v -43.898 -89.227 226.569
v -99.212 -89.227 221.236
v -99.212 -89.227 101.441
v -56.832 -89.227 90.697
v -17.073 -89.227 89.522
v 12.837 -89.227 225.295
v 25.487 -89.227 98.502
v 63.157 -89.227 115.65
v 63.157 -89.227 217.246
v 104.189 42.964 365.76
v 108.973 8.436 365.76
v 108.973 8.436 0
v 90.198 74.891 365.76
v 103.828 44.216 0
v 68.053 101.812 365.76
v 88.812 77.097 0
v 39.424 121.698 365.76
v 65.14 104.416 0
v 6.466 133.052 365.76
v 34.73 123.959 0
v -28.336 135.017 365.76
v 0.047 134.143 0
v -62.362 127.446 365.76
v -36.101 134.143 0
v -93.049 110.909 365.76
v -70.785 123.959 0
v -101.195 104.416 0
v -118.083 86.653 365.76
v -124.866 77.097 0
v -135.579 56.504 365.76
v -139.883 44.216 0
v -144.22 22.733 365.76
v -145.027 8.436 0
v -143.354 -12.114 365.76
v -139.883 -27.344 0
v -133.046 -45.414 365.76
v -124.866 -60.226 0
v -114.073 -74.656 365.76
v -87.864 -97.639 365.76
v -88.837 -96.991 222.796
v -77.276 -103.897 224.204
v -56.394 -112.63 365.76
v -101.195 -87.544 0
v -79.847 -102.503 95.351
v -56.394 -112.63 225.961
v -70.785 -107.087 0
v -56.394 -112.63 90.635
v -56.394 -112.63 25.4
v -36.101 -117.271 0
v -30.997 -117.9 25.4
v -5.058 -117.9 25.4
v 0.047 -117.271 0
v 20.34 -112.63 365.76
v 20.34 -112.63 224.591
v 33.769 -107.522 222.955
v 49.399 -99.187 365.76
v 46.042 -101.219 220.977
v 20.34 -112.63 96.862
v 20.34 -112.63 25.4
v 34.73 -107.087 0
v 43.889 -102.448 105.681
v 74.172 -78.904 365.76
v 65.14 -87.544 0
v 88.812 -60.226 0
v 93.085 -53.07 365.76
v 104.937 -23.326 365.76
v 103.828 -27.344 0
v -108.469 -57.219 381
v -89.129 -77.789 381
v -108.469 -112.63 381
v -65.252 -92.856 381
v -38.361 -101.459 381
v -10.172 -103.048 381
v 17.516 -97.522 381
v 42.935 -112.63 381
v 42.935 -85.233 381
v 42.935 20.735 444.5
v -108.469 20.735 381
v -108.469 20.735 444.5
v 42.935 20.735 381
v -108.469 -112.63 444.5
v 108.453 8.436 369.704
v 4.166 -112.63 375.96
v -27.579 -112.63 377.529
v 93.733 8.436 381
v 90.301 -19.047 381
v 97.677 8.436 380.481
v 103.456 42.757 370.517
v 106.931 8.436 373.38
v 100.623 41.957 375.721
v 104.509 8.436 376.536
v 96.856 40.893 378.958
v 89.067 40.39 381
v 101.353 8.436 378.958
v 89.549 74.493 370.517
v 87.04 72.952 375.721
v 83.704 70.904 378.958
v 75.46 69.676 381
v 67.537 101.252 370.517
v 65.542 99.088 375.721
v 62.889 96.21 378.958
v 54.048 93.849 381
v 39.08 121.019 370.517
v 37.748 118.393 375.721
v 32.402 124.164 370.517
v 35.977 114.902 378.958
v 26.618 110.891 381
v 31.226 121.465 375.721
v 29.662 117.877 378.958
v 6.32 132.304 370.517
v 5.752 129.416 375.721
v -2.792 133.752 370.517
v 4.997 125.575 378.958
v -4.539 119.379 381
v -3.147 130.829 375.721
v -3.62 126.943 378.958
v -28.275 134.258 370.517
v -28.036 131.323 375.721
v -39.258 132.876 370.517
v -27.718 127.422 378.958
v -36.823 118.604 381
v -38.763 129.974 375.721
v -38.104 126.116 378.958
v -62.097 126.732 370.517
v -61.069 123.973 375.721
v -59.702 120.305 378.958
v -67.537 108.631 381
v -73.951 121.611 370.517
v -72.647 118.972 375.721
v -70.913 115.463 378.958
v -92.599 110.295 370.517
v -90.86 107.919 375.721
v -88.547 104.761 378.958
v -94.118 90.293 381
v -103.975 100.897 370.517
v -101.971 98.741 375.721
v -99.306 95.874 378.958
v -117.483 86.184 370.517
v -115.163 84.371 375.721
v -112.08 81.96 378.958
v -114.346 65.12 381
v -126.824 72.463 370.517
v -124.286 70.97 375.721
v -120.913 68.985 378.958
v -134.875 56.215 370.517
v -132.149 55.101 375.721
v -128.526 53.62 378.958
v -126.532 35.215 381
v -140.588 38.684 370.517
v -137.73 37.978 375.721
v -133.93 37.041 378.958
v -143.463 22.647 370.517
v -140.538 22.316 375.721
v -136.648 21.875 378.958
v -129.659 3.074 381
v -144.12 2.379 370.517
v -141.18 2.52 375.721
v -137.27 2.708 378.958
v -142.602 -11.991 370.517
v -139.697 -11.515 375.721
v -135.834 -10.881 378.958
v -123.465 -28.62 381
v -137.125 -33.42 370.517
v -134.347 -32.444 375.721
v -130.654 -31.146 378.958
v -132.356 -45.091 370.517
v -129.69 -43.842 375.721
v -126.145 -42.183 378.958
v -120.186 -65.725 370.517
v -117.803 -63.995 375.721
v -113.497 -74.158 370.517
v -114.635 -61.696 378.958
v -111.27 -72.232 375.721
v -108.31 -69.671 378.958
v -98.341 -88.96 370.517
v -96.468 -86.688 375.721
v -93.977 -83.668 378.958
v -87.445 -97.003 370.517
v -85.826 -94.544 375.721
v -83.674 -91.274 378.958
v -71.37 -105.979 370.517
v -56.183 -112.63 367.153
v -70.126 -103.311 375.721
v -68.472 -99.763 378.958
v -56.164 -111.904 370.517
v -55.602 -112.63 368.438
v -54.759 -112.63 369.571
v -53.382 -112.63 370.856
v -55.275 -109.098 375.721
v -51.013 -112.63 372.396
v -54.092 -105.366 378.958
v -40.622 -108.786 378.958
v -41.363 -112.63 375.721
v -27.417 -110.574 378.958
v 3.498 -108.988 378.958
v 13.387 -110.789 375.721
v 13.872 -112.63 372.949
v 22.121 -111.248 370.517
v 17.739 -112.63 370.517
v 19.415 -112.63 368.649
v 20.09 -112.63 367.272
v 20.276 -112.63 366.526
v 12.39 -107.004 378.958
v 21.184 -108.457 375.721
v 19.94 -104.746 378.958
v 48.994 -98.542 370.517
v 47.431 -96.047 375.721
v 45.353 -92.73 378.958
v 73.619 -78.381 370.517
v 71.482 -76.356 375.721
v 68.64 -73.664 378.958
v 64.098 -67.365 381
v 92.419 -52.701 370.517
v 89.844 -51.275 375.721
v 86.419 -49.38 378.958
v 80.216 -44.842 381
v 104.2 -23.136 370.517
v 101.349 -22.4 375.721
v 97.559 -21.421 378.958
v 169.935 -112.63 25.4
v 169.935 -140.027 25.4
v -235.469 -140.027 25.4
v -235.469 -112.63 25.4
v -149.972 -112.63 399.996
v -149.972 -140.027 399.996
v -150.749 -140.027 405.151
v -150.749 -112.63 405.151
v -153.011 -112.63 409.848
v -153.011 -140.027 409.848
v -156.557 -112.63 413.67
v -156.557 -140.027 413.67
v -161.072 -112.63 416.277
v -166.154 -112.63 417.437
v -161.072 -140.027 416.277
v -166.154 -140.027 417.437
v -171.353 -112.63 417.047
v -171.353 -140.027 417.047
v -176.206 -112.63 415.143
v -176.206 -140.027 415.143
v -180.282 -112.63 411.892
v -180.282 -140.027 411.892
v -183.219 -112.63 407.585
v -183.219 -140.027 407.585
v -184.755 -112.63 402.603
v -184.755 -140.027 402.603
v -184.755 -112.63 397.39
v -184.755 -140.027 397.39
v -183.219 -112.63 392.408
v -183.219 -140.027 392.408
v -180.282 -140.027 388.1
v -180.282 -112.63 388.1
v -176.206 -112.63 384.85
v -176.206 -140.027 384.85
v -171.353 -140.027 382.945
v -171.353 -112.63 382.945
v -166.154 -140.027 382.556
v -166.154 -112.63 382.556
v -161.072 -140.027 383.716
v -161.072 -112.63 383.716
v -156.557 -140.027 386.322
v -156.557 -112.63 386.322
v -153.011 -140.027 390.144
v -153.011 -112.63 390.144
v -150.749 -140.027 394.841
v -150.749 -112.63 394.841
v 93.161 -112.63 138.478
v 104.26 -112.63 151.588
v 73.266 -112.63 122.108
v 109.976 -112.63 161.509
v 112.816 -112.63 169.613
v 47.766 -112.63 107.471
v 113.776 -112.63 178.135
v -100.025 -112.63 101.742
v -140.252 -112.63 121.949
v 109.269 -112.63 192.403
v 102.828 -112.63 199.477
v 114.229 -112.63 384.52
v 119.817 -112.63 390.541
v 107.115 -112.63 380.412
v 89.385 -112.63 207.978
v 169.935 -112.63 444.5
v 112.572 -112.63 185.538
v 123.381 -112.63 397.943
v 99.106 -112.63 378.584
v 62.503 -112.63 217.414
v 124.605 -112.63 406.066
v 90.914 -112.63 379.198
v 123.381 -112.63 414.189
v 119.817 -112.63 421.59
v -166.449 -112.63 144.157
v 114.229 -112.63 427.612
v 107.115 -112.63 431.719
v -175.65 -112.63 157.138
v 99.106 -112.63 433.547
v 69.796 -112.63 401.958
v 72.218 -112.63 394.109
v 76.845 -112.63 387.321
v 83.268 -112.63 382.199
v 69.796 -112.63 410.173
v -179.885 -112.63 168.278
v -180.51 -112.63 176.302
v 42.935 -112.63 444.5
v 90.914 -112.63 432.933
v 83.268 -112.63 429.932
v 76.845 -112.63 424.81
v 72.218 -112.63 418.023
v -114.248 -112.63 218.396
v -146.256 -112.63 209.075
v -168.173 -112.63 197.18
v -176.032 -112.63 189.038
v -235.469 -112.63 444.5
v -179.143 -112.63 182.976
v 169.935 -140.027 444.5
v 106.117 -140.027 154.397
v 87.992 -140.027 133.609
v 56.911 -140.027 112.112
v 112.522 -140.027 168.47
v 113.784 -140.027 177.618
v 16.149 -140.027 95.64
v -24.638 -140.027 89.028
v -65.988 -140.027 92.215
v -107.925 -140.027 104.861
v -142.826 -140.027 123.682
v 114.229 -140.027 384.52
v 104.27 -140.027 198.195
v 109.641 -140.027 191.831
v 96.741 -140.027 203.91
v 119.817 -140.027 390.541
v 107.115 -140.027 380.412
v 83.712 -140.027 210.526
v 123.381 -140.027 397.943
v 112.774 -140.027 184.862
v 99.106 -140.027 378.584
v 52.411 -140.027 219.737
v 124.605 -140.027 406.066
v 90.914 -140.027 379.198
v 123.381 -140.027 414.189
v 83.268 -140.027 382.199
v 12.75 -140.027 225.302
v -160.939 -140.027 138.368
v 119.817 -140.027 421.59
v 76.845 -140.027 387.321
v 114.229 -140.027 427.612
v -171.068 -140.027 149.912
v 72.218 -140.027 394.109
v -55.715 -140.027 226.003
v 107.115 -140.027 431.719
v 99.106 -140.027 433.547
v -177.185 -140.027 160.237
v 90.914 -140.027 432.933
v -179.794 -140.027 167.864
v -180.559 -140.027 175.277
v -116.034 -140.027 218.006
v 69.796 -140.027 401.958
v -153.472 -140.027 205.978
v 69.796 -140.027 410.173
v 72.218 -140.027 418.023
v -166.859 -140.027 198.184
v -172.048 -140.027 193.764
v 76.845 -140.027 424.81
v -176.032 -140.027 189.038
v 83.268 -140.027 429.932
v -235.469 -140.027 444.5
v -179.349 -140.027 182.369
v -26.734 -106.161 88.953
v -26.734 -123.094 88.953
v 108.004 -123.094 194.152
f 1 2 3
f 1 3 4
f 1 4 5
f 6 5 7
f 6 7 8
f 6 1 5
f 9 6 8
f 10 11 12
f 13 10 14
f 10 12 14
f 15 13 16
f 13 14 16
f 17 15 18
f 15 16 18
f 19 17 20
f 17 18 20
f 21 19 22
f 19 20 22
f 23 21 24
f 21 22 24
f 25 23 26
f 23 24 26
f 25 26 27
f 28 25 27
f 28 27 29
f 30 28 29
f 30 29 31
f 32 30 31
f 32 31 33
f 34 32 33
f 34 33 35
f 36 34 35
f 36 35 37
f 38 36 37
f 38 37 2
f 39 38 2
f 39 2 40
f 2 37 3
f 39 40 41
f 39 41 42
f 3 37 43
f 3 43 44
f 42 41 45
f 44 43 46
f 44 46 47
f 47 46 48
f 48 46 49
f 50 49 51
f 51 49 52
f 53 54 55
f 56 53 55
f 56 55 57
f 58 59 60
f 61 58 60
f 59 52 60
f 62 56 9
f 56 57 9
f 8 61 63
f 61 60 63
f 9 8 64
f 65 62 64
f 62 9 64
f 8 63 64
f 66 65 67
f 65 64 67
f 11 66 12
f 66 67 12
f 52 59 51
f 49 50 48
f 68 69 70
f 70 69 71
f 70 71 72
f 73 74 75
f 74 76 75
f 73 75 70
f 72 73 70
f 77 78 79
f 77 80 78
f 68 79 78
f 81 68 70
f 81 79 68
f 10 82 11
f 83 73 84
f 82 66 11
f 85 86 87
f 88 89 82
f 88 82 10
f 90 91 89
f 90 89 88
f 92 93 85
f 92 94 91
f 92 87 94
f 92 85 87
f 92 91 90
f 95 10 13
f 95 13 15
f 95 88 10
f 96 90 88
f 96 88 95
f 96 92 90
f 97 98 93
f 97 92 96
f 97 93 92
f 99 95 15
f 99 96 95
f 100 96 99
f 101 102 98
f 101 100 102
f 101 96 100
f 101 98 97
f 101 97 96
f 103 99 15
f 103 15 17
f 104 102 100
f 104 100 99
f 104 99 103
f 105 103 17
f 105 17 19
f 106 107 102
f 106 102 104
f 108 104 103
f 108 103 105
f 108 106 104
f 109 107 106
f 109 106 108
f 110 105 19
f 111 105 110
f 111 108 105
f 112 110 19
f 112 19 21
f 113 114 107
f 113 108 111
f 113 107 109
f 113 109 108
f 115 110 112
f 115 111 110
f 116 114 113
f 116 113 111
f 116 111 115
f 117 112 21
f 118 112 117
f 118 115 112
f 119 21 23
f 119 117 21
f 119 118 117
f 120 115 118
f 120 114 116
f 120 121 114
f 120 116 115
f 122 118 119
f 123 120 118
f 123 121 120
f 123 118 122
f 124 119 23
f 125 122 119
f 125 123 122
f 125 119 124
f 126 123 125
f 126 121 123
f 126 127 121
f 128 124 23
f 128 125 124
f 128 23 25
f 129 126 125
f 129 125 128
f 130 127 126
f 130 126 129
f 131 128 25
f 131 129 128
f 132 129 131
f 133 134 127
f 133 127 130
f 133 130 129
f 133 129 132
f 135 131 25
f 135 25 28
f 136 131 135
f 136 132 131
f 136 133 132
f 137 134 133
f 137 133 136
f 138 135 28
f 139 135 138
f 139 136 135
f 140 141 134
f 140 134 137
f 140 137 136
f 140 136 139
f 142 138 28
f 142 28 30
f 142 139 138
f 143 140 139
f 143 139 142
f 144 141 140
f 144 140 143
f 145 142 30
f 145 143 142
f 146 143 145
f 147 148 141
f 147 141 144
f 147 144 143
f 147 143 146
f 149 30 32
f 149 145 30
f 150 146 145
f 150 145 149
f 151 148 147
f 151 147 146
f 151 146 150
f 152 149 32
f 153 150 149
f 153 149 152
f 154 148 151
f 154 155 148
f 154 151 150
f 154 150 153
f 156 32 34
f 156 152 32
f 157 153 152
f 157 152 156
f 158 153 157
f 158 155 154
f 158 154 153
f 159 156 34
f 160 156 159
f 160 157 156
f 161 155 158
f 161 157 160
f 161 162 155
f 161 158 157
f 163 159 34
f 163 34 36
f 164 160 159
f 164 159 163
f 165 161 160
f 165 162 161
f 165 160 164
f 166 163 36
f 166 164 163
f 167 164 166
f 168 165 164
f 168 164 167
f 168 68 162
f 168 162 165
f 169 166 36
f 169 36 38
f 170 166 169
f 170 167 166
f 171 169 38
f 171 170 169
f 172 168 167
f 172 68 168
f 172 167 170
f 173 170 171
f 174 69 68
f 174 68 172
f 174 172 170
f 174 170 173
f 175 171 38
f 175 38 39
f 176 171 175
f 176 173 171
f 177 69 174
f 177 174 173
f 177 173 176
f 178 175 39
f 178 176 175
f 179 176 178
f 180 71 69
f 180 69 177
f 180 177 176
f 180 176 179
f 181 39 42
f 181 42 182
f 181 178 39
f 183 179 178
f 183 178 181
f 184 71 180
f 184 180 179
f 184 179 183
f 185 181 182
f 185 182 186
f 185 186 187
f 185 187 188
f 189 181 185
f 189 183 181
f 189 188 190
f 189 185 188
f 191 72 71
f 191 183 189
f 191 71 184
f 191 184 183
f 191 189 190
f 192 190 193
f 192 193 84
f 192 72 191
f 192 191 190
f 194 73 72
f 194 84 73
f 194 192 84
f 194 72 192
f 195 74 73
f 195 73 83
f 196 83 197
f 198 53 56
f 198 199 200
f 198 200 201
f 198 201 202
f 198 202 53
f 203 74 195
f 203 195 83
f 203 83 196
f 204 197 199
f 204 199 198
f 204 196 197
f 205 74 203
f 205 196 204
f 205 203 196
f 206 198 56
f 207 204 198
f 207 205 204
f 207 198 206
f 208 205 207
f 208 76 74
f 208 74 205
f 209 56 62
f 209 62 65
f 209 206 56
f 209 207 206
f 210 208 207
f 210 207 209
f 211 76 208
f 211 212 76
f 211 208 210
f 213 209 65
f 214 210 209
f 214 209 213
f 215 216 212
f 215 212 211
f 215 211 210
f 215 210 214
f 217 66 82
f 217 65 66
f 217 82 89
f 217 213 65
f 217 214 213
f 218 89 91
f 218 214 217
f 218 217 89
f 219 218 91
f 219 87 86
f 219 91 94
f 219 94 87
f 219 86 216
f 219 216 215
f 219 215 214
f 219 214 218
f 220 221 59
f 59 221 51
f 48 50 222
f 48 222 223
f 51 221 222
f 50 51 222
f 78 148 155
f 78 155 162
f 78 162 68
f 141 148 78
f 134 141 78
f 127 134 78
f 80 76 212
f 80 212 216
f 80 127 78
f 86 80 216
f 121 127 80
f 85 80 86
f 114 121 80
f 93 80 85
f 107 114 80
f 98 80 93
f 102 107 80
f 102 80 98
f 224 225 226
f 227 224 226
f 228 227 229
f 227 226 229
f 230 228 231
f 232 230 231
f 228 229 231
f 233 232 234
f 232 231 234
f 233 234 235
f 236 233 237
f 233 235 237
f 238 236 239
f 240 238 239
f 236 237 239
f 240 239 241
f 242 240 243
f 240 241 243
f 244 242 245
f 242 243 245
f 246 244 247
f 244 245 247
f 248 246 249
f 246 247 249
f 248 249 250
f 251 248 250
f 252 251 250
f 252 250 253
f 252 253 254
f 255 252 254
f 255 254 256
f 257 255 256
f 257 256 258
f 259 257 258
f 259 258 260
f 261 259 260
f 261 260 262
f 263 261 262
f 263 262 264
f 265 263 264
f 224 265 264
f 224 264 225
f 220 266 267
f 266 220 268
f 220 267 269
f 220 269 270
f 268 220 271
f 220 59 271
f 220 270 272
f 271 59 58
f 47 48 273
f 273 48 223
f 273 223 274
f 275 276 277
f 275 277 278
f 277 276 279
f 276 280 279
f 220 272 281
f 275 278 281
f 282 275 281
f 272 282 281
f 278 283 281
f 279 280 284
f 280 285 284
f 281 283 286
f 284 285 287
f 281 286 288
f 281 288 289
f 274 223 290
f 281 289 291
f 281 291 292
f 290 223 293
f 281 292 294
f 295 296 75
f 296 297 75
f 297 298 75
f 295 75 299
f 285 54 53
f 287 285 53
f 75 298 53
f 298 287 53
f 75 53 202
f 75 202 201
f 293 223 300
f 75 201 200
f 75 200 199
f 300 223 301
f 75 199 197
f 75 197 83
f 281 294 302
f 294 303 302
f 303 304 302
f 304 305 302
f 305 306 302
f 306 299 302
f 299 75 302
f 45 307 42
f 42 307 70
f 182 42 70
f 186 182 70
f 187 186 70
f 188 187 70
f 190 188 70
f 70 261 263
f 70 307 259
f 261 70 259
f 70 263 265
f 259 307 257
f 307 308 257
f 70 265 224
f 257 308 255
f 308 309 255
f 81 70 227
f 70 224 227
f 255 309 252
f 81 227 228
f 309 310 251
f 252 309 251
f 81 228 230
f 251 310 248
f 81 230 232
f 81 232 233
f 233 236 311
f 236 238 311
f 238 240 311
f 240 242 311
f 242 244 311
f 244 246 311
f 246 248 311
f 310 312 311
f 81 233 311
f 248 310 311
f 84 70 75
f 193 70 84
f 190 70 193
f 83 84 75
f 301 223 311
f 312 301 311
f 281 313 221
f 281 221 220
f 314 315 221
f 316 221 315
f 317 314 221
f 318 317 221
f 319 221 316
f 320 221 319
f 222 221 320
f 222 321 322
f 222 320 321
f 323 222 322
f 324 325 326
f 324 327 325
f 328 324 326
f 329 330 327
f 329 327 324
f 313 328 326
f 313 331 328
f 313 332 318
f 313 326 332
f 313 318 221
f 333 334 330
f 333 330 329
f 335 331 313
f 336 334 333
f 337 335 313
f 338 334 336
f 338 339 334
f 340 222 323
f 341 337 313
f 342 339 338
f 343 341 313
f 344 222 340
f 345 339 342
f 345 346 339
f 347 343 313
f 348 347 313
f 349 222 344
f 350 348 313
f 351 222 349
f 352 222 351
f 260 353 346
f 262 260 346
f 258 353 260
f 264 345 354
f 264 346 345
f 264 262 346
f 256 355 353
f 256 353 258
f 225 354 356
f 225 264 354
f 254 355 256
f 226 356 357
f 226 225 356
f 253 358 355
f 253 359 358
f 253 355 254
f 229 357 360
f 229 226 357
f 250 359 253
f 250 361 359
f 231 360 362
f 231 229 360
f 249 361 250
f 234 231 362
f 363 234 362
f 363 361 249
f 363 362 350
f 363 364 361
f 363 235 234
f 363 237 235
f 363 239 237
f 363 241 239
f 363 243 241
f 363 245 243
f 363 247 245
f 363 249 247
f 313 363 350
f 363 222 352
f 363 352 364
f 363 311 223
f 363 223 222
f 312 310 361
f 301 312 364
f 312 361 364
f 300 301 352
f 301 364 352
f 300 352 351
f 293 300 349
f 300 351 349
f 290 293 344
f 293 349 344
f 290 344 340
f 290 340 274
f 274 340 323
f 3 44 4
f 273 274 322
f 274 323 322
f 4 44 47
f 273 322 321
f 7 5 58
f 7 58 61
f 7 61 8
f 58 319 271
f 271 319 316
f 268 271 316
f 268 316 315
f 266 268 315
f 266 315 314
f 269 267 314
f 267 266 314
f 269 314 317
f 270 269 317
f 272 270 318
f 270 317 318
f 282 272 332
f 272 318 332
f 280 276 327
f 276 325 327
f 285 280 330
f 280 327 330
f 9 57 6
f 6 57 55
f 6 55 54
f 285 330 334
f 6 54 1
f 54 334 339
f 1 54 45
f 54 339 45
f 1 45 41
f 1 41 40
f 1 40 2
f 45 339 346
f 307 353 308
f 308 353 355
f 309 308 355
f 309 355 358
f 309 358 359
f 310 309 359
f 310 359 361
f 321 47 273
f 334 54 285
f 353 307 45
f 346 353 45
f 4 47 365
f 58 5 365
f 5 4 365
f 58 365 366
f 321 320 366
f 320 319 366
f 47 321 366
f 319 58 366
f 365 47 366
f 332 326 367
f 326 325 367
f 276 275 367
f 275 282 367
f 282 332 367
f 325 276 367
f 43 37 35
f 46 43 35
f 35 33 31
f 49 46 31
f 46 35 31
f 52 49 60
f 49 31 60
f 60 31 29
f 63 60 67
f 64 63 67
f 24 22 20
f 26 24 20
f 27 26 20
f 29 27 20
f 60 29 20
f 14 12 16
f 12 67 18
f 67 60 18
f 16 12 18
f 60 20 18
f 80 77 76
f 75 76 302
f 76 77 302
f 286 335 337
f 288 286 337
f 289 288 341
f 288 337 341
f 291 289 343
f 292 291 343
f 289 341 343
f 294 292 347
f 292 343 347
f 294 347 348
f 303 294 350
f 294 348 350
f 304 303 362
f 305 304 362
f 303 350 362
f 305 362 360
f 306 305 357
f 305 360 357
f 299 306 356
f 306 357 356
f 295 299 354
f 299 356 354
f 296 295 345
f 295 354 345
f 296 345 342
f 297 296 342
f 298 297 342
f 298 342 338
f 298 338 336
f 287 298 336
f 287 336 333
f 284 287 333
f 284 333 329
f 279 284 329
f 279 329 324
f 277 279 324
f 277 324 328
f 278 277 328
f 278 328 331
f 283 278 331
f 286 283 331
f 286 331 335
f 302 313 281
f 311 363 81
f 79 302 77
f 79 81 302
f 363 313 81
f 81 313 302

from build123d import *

# Parameters (mm, degrees)
F0_R      = 127
F1_DEPTH  = 381
F2_R      = 15.24
F3_W      = 126.0042116046
F3_H      = 33.7627371773
F4_DEPTH  = 63.5
F5_W      = 126.0042116046
F5_H      = 63.5
F6_DEPTH  = 127
F7_W      = 126.0042116046
F7_H      = 27.3971298127
F8_DEPTH  = 355.6
F9_DEPTH  = 25.4
F11_DEPTH = 127
F12_W     = 27.3971298127
F12_H     = 419.1
F13_DEPTH = 127
F14_R     = 17.4895868551
F14_R_2   = 27.5583251685
F15_DEPTH = 50.8


with BuildPart() as f1:
    # F0 (on Top) → F1 (new body)
    with BuildSketch(Plane.XY):
        with Locations((-18.0272441357, 8.4358751774)):
            Circle(F0_R)
    extrude(amount=F1_DEPTH)

    # F2
    f2_edges = [f1.edges().sort_by_distance(p)[0] for p in [
        (-145.027244, 8.435875, 381),
    ]]
    fillet(f2_edges, radius=F2_R)

    # F3 (on face) → F4 (join)
    with BuildSketch(Plane.XY.offset(381)):
        with Locations((-20.0667567551, 3.8541001268)):
            Rectangle(F3_W, F3_H)
    extrude(amount=F4_DEPTH)

    # F5 (on face) → F6 (join)
    with BuildSketch(Plane.XZ.offset(13.0272684619)):
        with Locations((-20.0667567551, 412.75)):
            Rectangle(F5_W, F5_H)
    extrude(amount=F6_DEPTH)

    # F7 (on face) → F8 (join)
    with BuildSketch(Plane(origin=(0, 0, 381), x_dir=(1, 0, 0), z_dir=(0, 0, -1))):
        with Locations((-20.0667567551, 126.3287035555)):
            Rectangle(F7_W, F7_H)
    extrude(amount=F8_DEPTH)

    # F9 (add): a face of the model
    f9_faces = [f1.faces().sort_by_distance(p)[0] for p in [
        (-83.0688625574, -135.5385106419, 234.95),
    ]]
    extrude(f9_faces, amount=F9_DEPTH)

    # F10 (on face) → F11 (join)
    with BuildSketch(Plane(origin=(-108.4688625574, 0, 0), x_dir=(0, -1, 0), z_dir=(-1, 0, 0))):
        Polygon((140.0272684619, 25.4), (140.0272684619, 444.5), (112.6301386492, 444.5), (112.6301386492, 381), (112.6301386492, 25.4), align=None)
    extrude(amount=F11_DEPTH)

    # F12 (on face) → F13 (join)
    with BuildSketch(Plane.YZ.offset(42.9353490472)):
        with Locations((-126.3287035555, 234.95)):
            Rectangle(F12_W, F12_H)
    extrude(amount=F13_DEPTH)

    # F14 (on face) → F15 (cut)
    with BuildSketch(Plane.XZ.offset(140.0272684619)):
        with Locations((-167.4611866474, 399.9962210655)):
            Circle(F14_R)
        with Locations((97.0467850566, 406.0656428337)):
            Circle(F14_R_2)
        with BuildLine():
            add(Edge.make_bspline(
                [(-176.0322153568, 189.0380978584), (-201.9253380349, 151.3628030109), (-24.8268478885, 23.085444119), (238.6265275345, 243.979797102), (-143.4799308709, 236.4026792268), (-176.0322153568, 189.0380978584)],
                knots=[0, 0, 0, 0, 0.3093685357, 0.6110684405, 1, 1, 1, 1], degree=3))
        make_face()
    extrude(amount=-F15_DEPTH, mode=Mode.SUBTRACT)


solid = f1.part
